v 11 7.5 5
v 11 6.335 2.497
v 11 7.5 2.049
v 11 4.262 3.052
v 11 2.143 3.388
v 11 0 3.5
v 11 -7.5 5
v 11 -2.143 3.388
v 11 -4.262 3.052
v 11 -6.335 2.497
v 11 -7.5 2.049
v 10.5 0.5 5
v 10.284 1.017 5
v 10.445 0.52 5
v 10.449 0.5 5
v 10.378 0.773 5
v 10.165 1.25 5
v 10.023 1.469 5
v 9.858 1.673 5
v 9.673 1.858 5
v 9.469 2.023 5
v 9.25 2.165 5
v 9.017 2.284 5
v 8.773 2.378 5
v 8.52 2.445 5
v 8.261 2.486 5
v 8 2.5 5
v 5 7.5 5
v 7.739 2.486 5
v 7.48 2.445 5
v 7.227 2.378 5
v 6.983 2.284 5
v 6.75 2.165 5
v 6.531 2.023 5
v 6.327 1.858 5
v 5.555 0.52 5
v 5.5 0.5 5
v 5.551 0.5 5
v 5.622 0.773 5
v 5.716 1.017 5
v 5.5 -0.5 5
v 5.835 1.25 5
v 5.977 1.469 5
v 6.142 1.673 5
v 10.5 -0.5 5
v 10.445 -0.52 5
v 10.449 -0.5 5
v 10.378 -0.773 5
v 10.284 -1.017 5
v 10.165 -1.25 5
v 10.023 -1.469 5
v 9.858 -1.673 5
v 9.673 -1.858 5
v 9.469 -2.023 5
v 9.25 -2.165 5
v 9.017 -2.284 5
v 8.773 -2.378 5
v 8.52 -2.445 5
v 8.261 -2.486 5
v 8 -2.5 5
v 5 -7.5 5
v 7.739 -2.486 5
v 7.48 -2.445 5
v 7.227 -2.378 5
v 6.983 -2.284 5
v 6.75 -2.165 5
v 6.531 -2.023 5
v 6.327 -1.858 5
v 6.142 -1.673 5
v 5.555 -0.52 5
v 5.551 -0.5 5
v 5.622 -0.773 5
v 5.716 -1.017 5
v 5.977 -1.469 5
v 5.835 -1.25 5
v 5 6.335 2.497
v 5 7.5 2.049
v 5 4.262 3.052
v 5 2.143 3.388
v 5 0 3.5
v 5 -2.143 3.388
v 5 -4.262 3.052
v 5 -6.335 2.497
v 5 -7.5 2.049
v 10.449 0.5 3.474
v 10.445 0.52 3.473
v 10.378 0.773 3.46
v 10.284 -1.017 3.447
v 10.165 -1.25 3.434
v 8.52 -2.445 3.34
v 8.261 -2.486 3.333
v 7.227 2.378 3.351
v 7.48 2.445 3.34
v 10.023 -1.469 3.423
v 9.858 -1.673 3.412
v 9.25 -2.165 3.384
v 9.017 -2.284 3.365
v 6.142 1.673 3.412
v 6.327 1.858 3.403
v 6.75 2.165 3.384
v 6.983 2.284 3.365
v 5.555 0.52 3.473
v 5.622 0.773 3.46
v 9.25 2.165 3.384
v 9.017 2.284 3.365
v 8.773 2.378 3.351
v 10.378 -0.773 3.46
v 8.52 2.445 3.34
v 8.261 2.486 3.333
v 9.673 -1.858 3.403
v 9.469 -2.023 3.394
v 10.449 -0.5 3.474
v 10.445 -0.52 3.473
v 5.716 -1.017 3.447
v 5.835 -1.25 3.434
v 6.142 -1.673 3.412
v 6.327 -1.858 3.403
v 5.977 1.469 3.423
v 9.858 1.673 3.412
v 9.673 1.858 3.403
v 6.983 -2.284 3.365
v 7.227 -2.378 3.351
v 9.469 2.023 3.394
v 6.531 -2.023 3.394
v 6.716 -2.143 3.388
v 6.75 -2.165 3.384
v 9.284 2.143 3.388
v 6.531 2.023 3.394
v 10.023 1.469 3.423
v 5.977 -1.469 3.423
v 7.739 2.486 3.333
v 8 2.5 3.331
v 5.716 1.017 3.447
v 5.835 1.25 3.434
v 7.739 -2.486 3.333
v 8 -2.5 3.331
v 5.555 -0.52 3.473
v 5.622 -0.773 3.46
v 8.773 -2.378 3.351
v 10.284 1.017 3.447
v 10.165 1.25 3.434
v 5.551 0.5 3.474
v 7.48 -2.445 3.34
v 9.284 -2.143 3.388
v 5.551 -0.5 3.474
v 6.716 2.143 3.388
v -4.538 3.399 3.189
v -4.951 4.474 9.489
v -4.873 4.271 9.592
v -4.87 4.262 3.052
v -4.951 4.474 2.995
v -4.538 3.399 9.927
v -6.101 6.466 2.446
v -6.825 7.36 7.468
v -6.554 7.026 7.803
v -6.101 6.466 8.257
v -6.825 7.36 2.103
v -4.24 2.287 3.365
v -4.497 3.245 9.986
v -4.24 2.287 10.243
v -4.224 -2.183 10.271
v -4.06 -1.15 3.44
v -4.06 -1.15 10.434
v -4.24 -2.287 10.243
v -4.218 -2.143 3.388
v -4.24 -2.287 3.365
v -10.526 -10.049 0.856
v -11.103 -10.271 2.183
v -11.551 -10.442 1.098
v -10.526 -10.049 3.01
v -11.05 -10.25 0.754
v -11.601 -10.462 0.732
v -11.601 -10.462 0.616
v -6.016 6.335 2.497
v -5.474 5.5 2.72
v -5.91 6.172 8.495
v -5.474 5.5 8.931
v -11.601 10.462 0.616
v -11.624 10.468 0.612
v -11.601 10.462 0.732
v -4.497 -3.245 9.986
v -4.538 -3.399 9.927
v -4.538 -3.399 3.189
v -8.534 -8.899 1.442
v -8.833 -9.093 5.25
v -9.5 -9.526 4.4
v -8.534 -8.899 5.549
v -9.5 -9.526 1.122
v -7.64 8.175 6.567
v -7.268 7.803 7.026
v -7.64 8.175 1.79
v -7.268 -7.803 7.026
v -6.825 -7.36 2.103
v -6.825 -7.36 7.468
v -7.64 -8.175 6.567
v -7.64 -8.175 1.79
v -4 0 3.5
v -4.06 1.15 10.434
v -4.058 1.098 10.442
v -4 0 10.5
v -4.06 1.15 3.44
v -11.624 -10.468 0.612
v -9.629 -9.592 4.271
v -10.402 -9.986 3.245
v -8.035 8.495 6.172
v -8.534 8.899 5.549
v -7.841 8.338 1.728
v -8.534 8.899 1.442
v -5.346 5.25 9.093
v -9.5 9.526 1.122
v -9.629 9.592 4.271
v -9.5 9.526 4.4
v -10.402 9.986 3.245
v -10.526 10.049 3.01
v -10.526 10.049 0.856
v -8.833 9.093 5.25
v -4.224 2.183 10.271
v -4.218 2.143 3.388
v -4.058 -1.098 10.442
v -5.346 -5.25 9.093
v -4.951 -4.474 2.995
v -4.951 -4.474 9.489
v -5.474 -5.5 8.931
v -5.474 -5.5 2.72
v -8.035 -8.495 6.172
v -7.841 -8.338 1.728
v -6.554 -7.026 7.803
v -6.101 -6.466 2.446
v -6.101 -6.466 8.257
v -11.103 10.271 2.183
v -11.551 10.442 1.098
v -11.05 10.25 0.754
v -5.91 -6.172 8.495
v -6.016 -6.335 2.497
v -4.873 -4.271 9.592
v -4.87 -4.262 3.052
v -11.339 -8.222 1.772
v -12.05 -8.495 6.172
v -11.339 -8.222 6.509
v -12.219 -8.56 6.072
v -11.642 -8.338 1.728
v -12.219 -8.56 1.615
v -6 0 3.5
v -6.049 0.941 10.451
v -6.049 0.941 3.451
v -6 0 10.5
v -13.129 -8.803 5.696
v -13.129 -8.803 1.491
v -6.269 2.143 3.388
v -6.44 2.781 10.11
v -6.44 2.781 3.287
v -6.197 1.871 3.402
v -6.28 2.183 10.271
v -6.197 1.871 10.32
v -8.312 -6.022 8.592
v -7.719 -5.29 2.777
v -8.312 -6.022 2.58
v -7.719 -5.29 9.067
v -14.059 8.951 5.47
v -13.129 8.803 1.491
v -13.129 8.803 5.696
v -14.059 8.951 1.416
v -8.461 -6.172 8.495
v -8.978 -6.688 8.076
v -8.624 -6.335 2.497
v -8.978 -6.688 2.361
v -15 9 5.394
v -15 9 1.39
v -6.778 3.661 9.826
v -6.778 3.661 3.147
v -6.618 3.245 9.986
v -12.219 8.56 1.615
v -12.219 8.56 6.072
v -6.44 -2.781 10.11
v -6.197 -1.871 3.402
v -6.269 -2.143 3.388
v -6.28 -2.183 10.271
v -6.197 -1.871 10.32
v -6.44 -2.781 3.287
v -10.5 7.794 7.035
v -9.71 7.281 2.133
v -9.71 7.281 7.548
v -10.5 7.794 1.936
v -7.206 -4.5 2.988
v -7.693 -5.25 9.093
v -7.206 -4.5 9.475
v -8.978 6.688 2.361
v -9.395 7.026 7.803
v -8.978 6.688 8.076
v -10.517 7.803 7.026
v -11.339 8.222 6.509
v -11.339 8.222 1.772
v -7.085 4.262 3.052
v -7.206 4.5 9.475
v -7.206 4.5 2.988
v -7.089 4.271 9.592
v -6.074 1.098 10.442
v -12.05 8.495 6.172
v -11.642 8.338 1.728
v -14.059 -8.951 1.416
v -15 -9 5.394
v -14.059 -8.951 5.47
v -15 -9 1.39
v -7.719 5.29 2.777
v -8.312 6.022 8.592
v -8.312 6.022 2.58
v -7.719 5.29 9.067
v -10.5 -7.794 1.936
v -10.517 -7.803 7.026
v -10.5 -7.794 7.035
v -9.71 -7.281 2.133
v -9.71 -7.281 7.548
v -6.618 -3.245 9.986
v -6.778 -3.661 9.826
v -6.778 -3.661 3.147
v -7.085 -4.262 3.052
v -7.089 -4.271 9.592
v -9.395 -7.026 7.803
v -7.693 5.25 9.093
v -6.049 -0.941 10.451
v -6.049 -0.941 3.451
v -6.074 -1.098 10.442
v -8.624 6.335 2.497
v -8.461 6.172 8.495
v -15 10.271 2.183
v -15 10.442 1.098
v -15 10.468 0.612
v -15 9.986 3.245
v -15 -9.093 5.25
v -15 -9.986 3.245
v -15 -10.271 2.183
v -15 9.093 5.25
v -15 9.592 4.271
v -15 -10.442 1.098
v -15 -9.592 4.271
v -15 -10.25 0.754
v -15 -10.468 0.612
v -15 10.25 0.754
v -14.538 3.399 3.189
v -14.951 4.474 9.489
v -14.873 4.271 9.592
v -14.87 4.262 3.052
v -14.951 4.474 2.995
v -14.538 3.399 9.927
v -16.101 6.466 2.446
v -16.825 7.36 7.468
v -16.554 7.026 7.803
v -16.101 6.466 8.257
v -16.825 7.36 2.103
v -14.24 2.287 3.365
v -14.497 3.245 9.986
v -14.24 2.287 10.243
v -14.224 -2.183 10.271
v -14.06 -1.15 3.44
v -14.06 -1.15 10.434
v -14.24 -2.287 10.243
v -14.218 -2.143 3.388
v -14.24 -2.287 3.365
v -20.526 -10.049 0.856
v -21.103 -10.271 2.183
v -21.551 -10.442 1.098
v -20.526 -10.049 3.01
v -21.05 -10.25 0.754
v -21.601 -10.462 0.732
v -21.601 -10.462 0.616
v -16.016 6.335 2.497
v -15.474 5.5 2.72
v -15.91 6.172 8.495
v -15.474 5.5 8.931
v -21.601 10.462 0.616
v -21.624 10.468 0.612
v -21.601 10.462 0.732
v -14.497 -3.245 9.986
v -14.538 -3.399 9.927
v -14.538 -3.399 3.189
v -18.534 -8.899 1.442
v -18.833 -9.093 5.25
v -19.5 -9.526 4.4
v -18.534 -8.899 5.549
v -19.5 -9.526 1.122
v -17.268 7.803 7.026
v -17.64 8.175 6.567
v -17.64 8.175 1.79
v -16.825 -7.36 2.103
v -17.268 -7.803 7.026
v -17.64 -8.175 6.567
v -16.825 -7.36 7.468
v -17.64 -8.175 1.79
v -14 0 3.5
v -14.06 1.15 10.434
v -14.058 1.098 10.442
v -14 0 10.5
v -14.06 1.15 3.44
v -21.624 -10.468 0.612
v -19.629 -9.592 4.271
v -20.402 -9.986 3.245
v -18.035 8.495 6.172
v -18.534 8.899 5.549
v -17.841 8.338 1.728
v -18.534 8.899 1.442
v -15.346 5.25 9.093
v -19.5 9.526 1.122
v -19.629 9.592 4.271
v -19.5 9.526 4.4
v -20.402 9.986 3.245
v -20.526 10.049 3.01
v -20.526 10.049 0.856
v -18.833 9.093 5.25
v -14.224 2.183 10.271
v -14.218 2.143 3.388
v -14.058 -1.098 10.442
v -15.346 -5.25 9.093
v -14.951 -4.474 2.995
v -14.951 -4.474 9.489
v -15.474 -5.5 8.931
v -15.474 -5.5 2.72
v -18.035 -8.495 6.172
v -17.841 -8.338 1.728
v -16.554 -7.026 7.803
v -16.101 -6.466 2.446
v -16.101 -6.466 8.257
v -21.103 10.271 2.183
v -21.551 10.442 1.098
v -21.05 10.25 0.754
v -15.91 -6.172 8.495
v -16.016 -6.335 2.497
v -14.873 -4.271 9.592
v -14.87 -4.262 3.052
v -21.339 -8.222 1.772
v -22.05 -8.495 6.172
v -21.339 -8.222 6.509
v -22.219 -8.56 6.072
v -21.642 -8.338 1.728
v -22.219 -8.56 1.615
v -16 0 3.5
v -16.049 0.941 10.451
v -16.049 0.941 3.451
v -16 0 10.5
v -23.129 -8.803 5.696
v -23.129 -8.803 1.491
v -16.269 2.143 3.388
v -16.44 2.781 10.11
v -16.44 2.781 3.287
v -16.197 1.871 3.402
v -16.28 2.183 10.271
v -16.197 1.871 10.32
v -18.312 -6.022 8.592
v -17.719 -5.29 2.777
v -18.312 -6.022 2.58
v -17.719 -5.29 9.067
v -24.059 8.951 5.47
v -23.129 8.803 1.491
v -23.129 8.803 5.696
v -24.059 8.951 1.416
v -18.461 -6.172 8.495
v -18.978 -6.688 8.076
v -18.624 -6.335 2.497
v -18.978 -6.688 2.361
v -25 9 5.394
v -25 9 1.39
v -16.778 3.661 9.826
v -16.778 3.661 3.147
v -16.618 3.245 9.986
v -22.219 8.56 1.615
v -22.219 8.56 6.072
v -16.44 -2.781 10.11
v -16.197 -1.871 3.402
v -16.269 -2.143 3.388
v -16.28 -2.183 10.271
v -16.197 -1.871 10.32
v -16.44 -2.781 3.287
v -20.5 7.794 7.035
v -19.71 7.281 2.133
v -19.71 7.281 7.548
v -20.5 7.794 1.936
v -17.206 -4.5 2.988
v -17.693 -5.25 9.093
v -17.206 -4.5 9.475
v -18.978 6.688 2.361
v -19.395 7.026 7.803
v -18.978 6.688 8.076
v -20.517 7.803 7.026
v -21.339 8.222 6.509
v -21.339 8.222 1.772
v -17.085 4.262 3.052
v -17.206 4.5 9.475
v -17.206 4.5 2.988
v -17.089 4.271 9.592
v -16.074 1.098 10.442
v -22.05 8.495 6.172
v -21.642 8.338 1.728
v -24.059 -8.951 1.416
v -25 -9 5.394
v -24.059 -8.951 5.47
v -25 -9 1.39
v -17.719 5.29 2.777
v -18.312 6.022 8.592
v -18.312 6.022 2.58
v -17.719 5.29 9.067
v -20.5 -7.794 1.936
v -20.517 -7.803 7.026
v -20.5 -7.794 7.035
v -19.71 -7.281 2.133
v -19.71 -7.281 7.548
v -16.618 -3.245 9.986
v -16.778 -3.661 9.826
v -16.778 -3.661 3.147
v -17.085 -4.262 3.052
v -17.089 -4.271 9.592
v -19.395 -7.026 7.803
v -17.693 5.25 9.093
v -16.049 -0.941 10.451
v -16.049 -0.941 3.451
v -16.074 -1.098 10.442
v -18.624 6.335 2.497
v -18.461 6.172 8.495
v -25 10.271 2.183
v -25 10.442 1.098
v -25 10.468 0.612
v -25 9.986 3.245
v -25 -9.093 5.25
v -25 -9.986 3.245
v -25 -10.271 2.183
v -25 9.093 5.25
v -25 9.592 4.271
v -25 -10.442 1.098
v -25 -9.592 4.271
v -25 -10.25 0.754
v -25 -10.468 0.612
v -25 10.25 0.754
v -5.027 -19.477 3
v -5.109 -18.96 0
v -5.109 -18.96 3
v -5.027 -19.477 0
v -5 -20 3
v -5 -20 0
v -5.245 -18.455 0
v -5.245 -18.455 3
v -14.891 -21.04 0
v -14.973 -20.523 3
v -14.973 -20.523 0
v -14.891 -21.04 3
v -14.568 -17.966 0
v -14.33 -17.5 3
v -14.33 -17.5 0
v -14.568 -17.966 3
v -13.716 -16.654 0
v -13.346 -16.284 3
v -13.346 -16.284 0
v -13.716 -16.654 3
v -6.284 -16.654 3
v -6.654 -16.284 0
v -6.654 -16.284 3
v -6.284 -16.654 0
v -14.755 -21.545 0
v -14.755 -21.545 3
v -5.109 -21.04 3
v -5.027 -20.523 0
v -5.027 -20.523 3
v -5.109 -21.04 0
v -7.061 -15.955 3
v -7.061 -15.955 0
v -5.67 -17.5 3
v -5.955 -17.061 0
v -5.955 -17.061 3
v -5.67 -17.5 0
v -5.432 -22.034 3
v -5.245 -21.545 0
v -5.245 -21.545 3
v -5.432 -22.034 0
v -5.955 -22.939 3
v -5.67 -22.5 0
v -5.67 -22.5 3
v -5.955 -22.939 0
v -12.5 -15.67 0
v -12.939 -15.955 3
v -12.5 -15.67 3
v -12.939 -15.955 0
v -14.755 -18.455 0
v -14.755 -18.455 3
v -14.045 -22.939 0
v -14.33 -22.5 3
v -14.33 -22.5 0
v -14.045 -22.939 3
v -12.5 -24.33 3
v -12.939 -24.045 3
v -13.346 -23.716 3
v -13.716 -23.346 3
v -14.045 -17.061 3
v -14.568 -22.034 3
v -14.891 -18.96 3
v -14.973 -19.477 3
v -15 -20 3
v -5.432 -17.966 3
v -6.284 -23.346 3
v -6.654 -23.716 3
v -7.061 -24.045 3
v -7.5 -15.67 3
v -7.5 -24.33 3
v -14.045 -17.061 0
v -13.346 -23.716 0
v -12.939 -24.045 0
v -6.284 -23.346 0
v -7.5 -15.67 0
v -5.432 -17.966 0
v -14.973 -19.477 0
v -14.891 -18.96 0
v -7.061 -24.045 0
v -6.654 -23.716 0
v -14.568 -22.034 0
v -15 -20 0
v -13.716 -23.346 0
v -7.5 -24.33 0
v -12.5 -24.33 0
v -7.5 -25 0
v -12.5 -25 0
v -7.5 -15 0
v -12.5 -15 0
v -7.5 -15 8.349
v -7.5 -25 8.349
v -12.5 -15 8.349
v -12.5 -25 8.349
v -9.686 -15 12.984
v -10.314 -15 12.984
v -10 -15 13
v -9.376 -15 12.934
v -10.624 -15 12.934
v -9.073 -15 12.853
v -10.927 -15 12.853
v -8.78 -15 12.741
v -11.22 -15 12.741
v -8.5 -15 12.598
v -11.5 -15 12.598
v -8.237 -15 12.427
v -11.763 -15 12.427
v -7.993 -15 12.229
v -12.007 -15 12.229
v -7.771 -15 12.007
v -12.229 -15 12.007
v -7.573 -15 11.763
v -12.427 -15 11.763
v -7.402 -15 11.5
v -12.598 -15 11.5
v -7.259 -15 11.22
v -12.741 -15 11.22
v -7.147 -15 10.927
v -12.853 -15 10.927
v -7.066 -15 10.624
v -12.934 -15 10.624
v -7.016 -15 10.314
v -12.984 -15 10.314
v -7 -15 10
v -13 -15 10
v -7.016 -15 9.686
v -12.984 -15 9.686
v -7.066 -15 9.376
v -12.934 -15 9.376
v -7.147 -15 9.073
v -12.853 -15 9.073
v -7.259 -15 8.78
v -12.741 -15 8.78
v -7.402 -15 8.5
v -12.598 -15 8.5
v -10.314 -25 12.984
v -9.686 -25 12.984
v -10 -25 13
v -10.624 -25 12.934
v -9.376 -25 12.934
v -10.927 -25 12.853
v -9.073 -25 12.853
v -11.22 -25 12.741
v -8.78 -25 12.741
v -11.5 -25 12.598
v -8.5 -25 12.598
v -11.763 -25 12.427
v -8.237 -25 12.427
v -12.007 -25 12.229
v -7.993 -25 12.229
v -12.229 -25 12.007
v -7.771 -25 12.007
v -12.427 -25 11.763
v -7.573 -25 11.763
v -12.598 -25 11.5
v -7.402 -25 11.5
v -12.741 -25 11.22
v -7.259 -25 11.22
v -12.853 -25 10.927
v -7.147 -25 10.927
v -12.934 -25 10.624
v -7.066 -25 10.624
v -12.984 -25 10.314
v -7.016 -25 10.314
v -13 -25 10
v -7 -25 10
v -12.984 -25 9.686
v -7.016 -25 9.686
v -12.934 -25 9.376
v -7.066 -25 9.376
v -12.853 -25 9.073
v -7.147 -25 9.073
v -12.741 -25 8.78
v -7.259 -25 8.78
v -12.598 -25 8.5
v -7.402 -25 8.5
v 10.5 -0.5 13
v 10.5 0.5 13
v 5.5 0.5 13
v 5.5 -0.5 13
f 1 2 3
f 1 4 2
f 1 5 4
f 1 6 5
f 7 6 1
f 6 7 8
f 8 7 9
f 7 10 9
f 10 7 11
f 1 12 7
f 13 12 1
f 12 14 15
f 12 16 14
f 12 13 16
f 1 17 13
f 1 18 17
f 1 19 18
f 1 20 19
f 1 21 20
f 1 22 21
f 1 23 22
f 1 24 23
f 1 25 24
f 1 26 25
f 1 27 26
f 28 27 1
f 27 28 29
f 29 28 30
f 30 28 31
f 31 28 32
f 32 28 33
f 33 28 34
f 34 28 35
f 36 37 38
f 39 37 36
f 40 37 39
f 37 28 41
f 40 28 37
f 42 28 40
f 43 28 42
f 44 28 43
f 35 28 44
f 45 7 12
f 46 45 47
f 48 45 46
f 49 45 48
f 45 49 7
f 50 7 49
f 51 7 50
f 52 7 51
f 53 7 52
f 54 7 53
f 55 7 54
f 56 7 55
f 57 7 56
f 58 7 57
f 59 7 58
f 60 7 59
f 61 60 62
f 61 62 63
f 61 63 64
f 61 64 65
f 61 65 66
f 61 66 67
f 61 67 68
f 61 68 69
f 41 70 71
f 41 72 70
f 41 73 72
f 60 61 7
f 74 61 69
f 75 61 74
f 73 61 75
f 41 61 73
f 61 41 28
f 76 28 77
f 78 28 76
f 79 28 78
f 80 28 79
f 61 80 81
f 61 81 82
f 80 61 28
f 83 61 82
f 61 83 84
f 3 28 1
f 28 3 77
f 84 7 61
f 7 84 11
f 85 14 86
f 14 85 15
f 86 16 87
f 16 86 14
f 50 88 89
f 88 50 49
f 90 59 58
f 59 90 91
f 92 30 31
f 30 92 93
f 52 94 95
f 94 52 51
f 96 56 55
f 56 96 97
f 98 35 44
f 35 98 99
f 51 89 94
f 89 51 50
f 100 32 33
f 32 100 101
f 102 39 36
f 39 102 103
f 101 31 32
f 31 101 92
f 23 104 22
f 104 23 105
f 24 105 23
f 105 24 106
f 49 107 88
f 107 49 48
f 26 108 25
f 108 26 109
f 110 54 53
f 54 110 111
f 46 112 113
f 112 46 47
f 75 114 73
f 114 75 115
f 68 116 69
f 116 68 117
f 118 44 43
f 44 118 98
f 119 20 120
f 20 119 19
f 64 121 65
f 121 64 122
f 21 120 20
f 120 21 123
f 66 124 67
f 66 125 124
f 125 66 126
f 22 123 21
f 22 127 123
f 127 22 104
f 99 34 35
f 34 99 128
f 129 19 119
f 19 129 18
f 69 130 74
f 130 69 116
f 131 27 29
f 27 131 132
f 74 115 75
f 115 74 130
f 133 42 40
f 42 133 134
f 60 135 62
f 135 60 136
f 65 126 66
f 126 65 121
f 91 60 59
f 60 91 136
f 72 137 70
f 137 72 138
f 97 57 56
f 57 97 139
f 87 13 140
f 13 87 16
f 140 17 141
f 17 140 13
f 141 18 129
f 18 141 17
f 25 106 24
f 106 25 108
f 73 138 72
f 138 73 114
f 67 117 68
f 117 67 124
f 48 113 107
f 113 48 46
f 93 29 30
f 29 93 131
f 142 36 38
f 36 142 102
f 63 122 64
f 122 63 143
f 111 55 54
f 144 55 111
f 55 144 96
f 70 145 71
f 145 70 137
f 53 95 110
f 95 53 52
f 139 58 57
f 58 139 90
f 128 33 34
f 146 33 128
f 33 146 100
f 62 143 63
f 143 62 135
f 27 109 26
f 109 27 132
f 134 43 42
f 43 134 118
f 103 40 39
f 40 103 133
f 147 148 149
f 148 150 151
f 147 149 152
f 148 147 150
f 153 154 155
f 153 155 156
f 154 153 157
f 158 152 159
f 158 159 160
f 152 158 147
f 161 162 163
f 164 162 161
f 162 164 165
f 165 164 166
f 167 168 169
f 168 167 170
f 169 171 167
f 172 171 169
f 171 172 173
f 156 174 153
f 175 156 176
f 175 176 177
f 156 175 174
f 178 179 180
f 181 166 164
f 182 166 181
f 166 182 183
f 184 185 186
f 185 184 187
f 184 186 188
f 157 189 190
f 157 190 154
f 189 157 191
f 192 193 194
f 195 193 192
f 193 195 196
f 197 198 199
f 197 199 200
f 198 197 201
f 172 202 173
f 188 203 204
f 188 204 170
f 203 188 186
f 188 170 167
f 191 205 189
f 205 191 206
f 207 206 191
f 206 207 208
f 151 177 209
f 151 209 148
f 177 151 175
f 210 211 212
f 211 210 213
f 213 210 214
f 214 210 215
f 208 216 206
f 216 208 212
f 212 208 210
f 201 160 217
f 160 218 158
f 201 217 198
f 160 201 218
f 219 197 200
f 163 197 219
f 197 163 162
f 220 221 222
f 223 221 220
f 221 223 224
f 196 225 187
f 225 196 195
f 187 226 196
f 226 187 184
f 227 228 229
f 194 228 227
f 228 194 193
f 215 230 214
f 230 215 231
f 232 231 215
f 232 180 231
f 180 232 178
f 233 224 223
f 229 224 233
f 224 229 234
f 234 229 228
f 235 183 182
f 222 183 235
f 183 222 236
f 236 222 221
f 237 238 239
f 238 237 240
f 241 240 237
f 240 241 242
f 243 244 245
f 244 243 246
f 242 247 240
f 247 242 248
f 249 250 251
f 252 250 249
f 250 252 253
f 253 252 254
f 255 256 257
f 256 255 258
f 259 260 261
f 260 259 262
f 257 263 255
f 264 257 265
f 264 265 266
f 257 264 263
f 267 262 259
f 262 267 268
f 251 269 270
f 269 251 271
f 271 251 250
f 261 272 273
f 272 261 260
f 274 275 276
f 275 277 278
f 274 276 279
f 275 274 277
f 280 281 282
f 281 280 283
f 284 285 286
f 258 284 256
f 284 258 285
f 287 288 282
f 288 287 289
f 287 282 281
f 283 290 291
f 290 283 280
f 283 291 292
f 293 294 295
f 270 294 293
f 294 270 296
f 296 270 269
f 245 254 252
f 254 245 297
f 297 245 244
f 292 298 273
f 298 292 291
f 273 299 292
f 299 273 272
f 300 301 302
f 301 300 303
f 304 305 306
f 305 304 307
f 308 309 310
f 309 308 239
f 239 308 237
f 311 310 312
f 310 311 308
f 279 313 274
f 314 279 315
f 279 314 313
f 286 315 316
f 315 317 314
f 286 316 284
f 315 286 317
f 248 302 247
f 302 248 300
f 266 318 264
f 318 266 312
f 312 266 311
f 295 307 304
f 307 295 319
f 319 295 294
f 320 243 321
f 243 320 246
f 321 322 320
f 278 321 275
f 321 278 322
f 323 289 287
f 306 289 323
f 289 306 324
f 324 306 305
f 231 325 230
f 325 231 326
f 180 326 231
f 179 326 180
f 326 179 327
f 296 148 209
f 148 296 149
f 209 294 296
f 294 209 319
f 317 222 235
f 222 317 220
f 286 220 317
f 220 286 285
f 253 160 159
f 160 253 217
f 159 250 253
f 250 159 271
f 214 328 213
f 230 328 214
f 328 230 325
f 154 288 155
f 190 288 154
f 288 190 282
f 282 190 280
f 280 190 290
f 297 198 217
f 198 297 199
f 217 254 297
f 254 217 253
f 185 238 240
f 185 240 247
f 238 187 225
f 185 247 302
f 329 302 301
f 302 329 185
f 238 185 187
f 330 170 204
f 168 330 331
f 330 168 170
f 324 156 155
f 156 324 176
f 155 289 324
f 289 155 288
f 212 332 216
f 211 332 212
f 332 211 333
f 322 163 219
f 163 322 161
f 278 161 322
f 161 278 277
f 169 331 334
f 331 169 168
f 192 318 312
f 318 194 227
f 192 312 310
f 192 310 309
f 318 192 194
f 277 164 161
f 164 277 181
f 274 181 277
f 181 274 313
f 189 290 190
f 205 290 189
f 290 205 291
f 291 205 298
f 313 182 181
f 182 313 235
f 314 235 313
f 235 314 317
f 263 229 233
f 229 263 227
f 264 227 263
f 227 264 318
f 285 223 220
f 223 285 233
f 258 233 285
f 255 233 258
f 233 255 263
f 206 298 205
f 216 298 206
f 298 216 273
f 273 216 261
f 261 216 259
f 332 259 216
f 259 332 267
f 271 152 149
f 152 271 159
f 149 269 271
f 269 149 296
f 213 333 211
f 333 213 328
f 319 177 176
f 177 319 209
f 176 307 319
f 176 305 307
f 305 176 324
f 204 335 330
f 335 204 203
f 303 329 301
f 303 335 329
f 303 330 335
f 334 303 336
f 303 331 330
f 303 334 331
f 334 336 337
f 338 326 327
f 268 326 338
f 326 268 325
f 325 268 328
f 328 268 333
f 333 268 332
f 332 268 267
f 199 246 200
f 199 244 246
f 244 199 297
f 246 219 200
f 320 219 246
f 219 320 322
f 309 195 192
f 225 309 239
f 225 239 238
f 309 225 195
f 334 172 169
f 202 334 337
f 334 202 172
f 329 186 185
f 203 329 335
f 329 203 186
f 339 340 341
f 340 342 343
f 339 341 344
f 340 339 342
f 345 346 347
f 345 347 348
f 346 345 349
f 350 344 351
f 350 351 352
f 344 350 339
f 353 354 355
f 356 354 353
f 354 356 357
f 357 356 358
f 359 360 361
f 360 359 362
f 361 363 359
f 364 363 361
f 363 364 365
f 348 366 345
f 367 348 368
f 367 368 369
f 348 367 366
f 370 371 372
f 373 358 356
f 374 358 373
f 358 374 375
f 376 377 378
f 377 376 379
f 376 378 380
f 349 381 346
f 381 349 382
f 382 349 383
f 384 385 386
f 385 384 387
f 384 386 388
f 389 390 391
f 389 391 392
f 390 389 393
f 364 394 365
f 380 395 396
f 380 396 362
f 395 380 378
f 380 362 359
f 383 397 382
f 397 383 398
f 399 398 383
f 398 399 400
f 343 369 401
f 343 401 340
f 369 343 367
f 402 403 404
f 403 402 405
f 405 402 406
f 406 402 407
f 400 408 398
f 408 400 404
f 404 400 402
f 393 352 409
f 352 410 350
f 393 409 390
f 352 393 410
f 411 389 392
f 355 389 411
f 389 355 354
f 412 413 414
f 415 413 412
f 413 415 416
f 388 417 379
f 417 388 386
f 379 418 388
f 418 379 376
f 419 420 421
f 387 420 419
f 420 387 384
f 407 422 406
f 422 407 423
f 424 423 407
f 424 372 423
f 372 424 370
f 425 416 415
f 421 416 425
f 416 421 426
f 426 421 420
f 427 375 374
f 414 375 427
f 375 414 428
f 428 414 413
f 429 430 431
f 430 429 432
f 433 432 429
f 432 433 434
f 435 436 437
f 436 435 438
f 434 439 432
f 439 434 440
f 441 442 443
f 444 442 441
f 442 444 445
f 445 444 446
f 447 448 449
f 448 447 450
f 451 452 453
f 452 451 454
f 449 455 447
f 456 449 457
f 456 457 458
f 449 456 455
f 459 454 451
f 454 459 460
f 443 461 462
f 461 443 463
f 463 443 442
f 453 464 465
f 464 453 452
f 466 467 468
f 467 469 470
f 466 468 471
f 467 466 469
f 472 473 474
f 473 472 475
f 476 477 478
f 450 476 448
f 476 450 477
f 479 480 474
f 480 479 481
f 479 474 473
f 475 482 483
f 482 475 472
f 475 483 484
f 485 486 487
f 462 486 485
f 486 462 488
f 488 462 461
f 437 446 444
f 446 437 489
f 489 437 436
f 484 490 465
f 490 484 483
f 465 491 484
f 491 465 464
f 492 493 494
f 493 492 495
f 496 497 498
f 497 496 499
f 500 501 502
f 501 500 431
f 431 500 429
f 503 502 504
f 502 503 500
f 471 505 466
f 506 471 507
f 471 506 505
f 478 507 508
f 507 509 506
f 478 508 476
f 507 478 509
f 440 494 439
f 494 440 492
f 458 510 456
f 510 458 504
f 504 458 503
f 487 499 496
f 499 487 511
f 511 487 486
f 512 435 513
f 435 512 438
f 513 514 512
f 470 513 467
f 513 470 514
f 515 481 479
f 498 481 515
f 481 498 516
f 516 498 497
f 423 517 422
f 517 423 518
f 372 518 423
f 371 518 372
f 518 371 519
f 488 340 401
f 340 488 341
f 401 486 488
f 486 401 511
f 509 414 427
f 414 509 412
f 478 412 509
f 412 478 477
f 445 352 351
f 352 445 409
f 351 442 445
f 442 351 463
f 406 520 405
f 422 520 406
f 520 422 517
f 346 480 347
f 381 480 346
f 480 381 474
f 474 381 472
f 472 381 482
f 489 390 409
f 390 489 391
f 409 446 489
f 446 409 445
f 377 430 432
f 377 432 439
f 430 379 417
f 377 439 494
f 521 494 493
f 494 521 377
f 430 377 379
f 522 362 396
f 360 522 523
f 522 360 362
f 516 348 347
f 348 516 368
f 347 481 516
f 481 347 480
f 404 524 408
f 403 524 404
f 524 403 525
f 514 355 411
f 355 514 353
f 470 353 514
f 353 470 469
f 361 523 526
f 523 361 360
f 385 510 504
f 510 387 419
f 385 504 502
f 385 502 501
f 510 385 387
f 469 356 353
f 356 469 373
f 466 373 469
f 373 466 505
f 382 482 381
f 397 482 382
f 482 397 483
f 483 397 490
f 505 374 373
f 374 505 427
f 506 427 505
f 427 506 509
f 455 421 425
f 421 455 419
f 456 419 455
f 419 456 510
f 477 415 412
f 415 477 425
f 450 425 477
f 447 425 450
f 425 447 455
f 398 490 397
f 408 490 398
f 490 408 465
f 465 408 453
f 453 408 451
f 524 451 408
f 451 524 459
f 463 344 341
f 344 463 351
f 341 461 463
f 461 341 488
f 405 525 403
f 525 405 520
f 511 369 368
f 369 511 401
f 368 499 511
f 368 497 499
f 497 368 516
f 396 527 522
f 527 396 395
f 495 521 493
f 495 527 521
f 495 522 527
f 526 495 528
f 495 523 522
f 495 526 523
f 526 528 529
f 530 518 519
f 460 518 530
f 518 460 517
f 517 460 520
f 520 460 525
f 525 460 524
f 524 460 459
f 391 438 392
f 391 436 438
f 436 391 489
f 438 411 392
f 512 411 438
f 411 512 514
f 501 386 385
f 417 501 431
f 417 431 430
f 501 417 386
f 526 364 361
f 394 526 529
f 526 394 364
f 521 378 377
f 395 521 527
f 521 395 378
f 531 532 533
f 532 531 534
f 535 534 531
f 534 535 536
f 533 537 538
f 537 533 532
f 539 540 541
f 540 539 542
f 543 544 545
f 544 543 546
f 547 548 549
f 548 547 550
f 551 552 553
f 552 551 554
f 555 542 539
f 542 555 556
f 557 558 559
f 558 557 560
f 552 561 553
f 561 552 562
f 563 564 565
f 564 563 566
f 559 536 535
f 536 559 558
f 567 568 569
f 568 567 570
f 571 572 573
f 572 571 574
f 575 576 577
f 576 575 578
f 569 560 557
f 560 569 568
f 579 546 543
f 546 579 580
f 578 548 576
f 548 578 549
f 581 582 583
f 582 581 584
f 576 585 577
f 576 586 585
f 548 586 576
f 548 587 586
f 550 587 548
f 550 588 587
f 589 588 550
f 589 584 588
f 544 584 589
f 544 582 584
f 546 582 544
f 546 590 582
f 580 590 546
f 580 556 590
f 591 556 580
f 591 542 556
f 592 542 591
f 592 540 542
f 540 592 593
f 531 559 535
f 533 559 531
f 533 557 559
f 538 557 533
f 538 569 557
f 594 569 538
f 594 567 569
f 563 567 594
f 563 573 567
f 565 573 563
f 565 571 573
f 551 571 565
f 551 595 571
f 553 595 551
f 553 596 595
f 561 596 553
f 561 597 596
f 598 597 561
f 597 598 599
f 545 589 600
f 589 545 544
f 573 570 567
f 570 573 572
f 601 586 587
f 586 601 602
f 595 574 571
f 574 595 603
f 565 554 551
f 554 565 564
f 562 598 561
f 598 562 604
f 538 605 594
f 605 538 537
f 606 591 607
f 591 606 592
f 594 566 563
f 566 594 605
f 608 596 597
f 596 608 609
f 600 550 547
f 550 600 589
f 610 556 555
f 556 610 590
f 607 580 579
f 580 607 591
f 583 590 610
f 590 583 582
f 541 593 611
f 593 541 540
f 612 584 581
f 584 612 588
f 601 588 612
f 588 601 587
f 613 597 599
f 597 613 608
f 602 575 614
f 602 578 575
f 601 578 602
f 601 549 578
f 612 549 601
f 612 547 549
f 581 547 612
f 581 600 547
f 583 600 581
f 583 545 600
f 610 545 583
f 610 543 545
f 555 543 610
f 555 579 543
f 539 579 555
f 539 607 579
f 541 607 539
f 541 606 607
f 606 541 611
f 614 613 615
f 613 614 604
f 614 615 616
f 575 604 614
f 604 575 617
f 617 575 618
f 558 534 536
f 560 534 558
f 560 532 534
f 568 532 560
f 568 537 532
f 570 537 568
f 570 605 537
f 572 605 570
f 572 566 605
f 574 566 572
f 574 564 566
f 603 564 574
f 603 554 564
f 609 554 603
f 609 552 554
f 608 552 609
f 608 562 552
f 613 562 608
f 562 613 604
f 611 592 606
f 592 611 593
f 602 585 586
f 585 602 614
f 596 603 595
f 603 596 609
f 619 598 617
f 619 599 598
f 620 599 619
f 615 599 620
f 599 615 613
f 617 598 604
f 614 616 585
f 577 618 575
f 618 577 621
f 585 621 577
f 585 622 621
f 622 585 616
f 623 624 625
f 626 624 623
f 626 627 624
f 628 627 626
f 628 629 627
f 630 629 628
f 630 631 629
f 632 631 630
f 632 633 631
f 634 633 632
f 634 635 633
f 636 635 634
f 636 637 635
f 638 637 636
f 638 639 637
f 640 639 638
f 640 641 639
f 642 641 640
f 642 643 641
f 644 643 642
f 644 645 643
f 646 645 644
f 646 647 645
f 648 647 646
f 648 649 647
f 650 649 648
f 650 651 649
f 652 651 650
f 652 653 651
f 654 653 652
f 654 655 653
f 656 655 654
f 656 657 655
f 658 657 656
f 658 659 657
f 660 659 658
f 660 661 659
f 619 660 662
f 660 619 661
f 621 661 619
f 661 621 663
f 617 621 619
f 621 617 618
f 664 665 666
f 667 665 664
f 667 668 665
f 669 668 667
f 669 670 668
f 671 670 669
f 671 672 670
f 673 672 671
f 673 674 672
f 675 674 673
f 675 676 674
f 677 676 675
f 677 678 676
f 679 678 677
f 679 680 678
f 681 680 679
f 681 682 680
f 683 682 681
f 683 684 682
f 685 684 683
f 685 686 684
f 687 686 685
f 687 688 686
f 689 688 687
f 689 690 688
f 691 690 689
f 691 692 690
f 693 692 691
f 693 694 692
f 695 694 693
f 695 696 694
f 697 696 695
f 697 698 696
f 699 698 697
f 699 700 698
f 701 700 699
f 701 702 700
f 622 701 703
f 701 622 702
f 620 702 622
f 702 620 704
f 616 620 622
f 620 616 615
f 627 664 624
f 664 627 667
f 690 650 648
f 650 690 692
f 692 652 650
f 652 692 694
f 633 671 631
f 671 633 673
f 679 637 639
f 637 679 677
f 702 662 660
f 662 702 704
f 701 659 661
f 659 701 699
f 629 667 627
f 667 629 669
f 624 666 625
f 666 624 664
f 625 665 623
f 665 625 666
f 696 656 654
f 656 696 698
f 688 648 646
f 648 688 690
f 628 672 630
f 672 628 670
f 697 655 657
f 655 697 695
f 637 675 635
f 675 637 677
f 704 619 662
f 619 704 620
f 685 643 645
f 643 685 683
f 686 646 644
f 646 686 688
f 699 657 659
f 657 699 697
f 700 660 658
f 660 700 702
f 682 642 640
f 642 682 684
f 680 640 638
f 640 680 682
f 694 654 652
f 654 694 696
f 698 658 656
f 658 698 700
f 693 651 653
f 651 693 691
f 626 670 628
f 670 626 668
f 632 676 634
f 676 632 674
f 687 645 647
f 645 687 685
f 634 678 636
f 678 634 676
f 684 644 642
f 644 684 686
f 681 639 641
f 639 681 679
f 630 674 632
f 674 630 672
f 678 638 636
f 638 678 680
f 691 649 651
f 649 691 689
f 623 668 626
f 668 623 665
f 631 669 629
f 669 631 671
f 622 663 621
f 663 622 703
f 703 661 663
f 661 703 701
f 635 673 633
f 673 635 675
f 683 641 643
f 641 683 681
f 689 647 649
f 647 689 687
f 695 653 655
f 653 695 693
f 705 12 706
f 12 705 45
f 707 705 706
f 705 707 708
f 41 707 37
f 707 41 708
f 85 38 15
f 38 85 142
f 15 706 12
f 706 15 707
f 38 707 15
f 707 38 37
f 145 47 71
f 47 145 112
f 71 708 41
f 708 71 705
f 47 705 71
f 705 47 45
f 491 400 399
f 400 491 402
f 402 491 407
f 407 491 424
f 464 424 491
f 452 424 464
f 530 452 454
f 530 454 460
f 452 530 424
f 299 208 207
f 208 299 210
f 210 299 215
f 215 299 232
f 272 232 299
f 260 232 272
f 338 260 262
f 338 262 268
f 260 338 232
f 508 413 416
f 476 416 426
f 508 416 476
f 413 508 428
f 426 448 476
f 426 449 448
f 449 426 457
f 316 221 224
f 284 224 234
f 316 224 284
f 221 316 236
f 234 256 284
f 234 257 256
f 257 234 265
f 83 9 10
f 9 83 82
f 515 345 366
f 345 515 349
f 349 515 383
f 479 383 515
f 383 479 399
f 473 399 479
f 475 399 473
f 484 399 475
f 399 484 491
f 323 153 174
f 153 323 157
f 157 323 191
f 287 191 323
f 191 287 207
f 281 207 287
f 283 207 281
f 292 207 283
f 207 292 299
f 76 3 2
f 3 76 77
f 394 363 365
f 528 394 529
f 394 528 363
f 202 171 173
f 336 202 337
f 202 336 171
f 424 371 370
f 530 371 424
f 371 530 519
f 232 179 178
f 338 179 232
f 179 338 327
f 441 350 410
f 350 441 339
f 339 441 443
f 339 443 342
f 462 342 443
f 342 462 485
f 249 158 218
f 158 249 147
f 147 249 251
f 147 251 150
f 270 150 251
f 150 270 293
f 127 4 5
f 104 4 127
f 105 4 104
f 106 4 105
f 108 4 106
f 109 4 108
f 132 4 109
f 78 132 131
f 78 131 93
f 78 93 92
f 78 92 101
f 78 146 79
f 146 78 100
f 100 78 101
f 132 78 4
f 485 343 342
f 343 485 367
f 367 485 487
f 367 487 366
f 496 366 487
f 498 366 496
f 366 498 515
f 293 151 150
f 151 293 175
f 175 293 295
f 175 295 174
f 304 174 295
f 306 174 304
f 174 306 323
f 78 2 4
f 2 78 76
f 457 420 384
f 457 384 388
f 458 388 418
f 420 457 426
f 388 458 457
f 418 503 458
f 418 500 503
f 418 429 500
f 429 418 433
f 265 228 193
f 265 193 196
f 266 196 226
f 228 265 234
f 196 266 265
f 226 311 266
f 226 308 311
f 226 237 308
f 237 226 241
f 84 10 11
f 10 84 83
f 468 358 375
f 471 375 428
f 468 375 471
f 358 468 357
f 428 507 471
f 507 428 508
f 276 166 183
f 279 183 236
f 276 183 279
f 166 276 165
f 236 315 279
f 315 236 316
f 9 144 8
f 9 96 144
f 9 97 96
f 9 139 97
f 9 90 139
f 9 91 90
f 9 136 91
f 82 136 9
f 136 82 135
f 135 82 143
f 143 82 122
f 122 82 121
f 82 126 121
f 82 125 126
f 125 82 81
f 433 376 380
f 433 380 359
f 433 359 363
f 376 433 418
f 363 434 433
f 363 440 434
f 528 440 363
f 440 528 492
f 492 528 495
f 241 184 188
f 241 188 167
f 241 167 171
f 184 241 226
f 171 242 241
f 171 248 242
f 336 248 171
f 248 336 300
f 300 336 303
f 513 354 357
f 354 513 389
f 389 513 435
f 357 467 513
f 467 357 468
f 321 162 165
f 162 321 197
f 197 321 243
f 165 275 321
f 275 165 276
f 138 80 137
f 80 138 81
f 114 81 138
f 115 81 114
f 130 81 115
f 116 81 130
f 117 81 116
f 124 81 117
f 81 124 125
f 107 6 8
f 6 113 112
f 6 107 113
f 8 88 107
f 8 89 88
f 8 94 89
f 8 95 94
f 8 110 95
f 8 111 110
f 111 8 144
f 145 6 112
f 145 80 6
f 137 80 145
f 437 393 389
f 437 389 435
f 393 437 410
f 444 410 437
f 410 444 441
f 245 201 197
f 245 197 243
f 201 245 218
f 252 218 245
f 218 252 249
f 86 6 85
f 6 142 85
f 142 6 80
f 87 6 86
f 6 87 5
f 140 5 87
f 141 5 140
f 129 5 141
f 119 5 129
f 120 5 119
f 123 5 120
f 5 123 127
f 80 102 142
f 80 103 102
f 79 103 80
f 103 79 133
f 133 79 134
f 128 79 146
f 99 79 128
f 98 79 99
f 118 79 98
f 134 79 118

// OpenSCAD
resolution=60;		// $fn  fo
barrel_outer_d=35;
//	barrel_outer=bore_inner_d + 4;  //What IS this for???

ring_barrel_diff=1;				// Difference between rind outer and barrel outer

ring_inner_r=(barrel_outer_d+2)/2;
ring_outer_r=ring_inner_r+2;
ring_height=29;		//WAS 35
mount_inner_r=32/2;
vent_r=10/2;		// WAS 11.11/2;
vent_spacing_multiplier=2.75;
inset_height=ring_height;  //WAS  40;
barrel_length=180; //53;
barrel_outer_r=ring_outer_r;   //+2;

bore_inner_r=35/2-7.7;
bore_outer_r=bore_inner_r + 2;
max_sd3_print_height=8*2.5*10;
max_protrudes=max_sd3_print_height-ring_height;

bore_protrudes=barrel_length-2*ring_height;	// How much protrudes above mounting ring (+35)
bore_height=ring_height + bore_protrudes;		// Total bore-barrel height
bore_bottom_inset=15;	// was 12			// How much of bore may go into rifle
bore_bottom_inset_outer_r= 35/2-7.75;   //bore_inner_r + 1.0;	// What fits into rifle

echo("Bore inner R=",bore_inner_r,", Bore inset R=", bore_bottom_inset_outer_r);

muzzle_base_true_r=38.1/2;
muzzle_multiplier=ring_outer_r / muzzle_base_true_r;
muzzle_base_r=muzzle_base_true_r * muzzle_multiplier;
muzzle_tip_r=22.5/2 * muzzle_multiplier;
muzzle_middle_r=31/2 * muzzle_multiplier;
muzzle_hex_bolt_offset=2/3*muzzle_base_r;

sight_width=2;
sight_height=barrel_outer_r-bore_inner_r;
sight_length=2*sight_height;

blowback_r=22/2;
blowback_height=10.5;
module blowback_shield(height, radius) {
	intersection(){
		difference(){
			cylinder(h=blowback_height, r=blowback_r, $fn=resolution);
			translate([0,0,-0.5])
				cylinder(h=blowback_height+1, r=blowback_r-2, $fn=resolution);
		}
		rotate([90,0,0])
			cylinder(h=blowback_height+1, r=blowback_r-0.5, $fn=resolution);
	}
}



difference()	//Subtract the barrel
{
	union()		// all the bits
	{
		//  Front Sight
		//translate([0,barrel_outer_r - 2.5 ,barrel_length - ring_height - 18])		//rotate([180,-90,90])
		difference(){				// Sight guard
			translate([0,29.3/2,0])
				rotate([90,0,0])
					linear_extrude(height = 29.3) 
						import("sight-profile-1.dxf");  // MIGHT be 37
			union(){
				translate([-5,0,11.8])  
					rotate([0,90,0])  
						color("blue")	cylinder(r=15/2 , h=30, $fn=resolution);
				translate([-5,-15/2,11.8])	
					color("purple")		cube([30,15,15]);
	
				translate([-5,-29.3/2+1,0])
					rotate([-6,0,0])		translate([0,-30,0])
						color("green")	cube([30,30,30]);

				translate([-5,29.3/2-1,0])
					rotate([6,0,0])
						color("red") cube([30,30,30]);
			}	//end union
		}	  //end difference

		difference()	{				// Sight block
			translate([5,-15/2,0])
				color("brown")	cube([6,15,5]);

			translate([5+0.5+5/2,0,3])
				color("black")	cylinder(h=4, r=5/2, $fn=resolution);
		}	// end difference 		(sight)

		translate([5+0.5,-0.5,2])	// Sight Pin
			color("orange")		cube([5,1,11]);
//}	// End translate/rotate sight



		//  Front blowback shield
		//translate([-ring_outer_r+3,0,barrel_length-47.5])
		translate([-15,0,0])  rotate([0,0,90])
			//rotate([90,0,-90])
				blowback_shield(blowback_height,blowback_r);

		//  Rear blowback shield
		//translate([-ring_outer_r+3,0,vent_r-3.5])
		translate([-25,0,0])  rotate([0,0,90])
			//rotate([90,180,-90])
				blowback_shield(blowback_height,blowback_r);

		//  Dangly thing
		translate([-10,-20,0])
	//	translate([0,0,vent_r*1]) //inset_height ]) 
		//	for (z = [6])
		//	{
	//			translate ([0,0,z * vent_spacing_multiplier * vent_r + vent_r*1.5])
	//			{
					color("purple")
		//				rotate([90,0,45])
		//					translate([0,0,ring_inner_r-1])
					{
						cylinder(h=3, r=vent_r ,$fn=resolution);
						translate([-5/2,-vent_r,0])
							cube([5,vent_r*2,10]);
						rotate([90,0,0])		translate([0,10,-5])
						cylinder(h=10,r=3, $fn=resolution);
					}
	//			 }	// end translate	
		//	}	// end for

	}	//end union
	translate([-40,0,-barrel_outer_r+3.5])
		rotate([0,90,0])
			cylinder(h = barrel_length-inset_height, r=barrel_outer_r, $fn=resolution);
}	//end difference
